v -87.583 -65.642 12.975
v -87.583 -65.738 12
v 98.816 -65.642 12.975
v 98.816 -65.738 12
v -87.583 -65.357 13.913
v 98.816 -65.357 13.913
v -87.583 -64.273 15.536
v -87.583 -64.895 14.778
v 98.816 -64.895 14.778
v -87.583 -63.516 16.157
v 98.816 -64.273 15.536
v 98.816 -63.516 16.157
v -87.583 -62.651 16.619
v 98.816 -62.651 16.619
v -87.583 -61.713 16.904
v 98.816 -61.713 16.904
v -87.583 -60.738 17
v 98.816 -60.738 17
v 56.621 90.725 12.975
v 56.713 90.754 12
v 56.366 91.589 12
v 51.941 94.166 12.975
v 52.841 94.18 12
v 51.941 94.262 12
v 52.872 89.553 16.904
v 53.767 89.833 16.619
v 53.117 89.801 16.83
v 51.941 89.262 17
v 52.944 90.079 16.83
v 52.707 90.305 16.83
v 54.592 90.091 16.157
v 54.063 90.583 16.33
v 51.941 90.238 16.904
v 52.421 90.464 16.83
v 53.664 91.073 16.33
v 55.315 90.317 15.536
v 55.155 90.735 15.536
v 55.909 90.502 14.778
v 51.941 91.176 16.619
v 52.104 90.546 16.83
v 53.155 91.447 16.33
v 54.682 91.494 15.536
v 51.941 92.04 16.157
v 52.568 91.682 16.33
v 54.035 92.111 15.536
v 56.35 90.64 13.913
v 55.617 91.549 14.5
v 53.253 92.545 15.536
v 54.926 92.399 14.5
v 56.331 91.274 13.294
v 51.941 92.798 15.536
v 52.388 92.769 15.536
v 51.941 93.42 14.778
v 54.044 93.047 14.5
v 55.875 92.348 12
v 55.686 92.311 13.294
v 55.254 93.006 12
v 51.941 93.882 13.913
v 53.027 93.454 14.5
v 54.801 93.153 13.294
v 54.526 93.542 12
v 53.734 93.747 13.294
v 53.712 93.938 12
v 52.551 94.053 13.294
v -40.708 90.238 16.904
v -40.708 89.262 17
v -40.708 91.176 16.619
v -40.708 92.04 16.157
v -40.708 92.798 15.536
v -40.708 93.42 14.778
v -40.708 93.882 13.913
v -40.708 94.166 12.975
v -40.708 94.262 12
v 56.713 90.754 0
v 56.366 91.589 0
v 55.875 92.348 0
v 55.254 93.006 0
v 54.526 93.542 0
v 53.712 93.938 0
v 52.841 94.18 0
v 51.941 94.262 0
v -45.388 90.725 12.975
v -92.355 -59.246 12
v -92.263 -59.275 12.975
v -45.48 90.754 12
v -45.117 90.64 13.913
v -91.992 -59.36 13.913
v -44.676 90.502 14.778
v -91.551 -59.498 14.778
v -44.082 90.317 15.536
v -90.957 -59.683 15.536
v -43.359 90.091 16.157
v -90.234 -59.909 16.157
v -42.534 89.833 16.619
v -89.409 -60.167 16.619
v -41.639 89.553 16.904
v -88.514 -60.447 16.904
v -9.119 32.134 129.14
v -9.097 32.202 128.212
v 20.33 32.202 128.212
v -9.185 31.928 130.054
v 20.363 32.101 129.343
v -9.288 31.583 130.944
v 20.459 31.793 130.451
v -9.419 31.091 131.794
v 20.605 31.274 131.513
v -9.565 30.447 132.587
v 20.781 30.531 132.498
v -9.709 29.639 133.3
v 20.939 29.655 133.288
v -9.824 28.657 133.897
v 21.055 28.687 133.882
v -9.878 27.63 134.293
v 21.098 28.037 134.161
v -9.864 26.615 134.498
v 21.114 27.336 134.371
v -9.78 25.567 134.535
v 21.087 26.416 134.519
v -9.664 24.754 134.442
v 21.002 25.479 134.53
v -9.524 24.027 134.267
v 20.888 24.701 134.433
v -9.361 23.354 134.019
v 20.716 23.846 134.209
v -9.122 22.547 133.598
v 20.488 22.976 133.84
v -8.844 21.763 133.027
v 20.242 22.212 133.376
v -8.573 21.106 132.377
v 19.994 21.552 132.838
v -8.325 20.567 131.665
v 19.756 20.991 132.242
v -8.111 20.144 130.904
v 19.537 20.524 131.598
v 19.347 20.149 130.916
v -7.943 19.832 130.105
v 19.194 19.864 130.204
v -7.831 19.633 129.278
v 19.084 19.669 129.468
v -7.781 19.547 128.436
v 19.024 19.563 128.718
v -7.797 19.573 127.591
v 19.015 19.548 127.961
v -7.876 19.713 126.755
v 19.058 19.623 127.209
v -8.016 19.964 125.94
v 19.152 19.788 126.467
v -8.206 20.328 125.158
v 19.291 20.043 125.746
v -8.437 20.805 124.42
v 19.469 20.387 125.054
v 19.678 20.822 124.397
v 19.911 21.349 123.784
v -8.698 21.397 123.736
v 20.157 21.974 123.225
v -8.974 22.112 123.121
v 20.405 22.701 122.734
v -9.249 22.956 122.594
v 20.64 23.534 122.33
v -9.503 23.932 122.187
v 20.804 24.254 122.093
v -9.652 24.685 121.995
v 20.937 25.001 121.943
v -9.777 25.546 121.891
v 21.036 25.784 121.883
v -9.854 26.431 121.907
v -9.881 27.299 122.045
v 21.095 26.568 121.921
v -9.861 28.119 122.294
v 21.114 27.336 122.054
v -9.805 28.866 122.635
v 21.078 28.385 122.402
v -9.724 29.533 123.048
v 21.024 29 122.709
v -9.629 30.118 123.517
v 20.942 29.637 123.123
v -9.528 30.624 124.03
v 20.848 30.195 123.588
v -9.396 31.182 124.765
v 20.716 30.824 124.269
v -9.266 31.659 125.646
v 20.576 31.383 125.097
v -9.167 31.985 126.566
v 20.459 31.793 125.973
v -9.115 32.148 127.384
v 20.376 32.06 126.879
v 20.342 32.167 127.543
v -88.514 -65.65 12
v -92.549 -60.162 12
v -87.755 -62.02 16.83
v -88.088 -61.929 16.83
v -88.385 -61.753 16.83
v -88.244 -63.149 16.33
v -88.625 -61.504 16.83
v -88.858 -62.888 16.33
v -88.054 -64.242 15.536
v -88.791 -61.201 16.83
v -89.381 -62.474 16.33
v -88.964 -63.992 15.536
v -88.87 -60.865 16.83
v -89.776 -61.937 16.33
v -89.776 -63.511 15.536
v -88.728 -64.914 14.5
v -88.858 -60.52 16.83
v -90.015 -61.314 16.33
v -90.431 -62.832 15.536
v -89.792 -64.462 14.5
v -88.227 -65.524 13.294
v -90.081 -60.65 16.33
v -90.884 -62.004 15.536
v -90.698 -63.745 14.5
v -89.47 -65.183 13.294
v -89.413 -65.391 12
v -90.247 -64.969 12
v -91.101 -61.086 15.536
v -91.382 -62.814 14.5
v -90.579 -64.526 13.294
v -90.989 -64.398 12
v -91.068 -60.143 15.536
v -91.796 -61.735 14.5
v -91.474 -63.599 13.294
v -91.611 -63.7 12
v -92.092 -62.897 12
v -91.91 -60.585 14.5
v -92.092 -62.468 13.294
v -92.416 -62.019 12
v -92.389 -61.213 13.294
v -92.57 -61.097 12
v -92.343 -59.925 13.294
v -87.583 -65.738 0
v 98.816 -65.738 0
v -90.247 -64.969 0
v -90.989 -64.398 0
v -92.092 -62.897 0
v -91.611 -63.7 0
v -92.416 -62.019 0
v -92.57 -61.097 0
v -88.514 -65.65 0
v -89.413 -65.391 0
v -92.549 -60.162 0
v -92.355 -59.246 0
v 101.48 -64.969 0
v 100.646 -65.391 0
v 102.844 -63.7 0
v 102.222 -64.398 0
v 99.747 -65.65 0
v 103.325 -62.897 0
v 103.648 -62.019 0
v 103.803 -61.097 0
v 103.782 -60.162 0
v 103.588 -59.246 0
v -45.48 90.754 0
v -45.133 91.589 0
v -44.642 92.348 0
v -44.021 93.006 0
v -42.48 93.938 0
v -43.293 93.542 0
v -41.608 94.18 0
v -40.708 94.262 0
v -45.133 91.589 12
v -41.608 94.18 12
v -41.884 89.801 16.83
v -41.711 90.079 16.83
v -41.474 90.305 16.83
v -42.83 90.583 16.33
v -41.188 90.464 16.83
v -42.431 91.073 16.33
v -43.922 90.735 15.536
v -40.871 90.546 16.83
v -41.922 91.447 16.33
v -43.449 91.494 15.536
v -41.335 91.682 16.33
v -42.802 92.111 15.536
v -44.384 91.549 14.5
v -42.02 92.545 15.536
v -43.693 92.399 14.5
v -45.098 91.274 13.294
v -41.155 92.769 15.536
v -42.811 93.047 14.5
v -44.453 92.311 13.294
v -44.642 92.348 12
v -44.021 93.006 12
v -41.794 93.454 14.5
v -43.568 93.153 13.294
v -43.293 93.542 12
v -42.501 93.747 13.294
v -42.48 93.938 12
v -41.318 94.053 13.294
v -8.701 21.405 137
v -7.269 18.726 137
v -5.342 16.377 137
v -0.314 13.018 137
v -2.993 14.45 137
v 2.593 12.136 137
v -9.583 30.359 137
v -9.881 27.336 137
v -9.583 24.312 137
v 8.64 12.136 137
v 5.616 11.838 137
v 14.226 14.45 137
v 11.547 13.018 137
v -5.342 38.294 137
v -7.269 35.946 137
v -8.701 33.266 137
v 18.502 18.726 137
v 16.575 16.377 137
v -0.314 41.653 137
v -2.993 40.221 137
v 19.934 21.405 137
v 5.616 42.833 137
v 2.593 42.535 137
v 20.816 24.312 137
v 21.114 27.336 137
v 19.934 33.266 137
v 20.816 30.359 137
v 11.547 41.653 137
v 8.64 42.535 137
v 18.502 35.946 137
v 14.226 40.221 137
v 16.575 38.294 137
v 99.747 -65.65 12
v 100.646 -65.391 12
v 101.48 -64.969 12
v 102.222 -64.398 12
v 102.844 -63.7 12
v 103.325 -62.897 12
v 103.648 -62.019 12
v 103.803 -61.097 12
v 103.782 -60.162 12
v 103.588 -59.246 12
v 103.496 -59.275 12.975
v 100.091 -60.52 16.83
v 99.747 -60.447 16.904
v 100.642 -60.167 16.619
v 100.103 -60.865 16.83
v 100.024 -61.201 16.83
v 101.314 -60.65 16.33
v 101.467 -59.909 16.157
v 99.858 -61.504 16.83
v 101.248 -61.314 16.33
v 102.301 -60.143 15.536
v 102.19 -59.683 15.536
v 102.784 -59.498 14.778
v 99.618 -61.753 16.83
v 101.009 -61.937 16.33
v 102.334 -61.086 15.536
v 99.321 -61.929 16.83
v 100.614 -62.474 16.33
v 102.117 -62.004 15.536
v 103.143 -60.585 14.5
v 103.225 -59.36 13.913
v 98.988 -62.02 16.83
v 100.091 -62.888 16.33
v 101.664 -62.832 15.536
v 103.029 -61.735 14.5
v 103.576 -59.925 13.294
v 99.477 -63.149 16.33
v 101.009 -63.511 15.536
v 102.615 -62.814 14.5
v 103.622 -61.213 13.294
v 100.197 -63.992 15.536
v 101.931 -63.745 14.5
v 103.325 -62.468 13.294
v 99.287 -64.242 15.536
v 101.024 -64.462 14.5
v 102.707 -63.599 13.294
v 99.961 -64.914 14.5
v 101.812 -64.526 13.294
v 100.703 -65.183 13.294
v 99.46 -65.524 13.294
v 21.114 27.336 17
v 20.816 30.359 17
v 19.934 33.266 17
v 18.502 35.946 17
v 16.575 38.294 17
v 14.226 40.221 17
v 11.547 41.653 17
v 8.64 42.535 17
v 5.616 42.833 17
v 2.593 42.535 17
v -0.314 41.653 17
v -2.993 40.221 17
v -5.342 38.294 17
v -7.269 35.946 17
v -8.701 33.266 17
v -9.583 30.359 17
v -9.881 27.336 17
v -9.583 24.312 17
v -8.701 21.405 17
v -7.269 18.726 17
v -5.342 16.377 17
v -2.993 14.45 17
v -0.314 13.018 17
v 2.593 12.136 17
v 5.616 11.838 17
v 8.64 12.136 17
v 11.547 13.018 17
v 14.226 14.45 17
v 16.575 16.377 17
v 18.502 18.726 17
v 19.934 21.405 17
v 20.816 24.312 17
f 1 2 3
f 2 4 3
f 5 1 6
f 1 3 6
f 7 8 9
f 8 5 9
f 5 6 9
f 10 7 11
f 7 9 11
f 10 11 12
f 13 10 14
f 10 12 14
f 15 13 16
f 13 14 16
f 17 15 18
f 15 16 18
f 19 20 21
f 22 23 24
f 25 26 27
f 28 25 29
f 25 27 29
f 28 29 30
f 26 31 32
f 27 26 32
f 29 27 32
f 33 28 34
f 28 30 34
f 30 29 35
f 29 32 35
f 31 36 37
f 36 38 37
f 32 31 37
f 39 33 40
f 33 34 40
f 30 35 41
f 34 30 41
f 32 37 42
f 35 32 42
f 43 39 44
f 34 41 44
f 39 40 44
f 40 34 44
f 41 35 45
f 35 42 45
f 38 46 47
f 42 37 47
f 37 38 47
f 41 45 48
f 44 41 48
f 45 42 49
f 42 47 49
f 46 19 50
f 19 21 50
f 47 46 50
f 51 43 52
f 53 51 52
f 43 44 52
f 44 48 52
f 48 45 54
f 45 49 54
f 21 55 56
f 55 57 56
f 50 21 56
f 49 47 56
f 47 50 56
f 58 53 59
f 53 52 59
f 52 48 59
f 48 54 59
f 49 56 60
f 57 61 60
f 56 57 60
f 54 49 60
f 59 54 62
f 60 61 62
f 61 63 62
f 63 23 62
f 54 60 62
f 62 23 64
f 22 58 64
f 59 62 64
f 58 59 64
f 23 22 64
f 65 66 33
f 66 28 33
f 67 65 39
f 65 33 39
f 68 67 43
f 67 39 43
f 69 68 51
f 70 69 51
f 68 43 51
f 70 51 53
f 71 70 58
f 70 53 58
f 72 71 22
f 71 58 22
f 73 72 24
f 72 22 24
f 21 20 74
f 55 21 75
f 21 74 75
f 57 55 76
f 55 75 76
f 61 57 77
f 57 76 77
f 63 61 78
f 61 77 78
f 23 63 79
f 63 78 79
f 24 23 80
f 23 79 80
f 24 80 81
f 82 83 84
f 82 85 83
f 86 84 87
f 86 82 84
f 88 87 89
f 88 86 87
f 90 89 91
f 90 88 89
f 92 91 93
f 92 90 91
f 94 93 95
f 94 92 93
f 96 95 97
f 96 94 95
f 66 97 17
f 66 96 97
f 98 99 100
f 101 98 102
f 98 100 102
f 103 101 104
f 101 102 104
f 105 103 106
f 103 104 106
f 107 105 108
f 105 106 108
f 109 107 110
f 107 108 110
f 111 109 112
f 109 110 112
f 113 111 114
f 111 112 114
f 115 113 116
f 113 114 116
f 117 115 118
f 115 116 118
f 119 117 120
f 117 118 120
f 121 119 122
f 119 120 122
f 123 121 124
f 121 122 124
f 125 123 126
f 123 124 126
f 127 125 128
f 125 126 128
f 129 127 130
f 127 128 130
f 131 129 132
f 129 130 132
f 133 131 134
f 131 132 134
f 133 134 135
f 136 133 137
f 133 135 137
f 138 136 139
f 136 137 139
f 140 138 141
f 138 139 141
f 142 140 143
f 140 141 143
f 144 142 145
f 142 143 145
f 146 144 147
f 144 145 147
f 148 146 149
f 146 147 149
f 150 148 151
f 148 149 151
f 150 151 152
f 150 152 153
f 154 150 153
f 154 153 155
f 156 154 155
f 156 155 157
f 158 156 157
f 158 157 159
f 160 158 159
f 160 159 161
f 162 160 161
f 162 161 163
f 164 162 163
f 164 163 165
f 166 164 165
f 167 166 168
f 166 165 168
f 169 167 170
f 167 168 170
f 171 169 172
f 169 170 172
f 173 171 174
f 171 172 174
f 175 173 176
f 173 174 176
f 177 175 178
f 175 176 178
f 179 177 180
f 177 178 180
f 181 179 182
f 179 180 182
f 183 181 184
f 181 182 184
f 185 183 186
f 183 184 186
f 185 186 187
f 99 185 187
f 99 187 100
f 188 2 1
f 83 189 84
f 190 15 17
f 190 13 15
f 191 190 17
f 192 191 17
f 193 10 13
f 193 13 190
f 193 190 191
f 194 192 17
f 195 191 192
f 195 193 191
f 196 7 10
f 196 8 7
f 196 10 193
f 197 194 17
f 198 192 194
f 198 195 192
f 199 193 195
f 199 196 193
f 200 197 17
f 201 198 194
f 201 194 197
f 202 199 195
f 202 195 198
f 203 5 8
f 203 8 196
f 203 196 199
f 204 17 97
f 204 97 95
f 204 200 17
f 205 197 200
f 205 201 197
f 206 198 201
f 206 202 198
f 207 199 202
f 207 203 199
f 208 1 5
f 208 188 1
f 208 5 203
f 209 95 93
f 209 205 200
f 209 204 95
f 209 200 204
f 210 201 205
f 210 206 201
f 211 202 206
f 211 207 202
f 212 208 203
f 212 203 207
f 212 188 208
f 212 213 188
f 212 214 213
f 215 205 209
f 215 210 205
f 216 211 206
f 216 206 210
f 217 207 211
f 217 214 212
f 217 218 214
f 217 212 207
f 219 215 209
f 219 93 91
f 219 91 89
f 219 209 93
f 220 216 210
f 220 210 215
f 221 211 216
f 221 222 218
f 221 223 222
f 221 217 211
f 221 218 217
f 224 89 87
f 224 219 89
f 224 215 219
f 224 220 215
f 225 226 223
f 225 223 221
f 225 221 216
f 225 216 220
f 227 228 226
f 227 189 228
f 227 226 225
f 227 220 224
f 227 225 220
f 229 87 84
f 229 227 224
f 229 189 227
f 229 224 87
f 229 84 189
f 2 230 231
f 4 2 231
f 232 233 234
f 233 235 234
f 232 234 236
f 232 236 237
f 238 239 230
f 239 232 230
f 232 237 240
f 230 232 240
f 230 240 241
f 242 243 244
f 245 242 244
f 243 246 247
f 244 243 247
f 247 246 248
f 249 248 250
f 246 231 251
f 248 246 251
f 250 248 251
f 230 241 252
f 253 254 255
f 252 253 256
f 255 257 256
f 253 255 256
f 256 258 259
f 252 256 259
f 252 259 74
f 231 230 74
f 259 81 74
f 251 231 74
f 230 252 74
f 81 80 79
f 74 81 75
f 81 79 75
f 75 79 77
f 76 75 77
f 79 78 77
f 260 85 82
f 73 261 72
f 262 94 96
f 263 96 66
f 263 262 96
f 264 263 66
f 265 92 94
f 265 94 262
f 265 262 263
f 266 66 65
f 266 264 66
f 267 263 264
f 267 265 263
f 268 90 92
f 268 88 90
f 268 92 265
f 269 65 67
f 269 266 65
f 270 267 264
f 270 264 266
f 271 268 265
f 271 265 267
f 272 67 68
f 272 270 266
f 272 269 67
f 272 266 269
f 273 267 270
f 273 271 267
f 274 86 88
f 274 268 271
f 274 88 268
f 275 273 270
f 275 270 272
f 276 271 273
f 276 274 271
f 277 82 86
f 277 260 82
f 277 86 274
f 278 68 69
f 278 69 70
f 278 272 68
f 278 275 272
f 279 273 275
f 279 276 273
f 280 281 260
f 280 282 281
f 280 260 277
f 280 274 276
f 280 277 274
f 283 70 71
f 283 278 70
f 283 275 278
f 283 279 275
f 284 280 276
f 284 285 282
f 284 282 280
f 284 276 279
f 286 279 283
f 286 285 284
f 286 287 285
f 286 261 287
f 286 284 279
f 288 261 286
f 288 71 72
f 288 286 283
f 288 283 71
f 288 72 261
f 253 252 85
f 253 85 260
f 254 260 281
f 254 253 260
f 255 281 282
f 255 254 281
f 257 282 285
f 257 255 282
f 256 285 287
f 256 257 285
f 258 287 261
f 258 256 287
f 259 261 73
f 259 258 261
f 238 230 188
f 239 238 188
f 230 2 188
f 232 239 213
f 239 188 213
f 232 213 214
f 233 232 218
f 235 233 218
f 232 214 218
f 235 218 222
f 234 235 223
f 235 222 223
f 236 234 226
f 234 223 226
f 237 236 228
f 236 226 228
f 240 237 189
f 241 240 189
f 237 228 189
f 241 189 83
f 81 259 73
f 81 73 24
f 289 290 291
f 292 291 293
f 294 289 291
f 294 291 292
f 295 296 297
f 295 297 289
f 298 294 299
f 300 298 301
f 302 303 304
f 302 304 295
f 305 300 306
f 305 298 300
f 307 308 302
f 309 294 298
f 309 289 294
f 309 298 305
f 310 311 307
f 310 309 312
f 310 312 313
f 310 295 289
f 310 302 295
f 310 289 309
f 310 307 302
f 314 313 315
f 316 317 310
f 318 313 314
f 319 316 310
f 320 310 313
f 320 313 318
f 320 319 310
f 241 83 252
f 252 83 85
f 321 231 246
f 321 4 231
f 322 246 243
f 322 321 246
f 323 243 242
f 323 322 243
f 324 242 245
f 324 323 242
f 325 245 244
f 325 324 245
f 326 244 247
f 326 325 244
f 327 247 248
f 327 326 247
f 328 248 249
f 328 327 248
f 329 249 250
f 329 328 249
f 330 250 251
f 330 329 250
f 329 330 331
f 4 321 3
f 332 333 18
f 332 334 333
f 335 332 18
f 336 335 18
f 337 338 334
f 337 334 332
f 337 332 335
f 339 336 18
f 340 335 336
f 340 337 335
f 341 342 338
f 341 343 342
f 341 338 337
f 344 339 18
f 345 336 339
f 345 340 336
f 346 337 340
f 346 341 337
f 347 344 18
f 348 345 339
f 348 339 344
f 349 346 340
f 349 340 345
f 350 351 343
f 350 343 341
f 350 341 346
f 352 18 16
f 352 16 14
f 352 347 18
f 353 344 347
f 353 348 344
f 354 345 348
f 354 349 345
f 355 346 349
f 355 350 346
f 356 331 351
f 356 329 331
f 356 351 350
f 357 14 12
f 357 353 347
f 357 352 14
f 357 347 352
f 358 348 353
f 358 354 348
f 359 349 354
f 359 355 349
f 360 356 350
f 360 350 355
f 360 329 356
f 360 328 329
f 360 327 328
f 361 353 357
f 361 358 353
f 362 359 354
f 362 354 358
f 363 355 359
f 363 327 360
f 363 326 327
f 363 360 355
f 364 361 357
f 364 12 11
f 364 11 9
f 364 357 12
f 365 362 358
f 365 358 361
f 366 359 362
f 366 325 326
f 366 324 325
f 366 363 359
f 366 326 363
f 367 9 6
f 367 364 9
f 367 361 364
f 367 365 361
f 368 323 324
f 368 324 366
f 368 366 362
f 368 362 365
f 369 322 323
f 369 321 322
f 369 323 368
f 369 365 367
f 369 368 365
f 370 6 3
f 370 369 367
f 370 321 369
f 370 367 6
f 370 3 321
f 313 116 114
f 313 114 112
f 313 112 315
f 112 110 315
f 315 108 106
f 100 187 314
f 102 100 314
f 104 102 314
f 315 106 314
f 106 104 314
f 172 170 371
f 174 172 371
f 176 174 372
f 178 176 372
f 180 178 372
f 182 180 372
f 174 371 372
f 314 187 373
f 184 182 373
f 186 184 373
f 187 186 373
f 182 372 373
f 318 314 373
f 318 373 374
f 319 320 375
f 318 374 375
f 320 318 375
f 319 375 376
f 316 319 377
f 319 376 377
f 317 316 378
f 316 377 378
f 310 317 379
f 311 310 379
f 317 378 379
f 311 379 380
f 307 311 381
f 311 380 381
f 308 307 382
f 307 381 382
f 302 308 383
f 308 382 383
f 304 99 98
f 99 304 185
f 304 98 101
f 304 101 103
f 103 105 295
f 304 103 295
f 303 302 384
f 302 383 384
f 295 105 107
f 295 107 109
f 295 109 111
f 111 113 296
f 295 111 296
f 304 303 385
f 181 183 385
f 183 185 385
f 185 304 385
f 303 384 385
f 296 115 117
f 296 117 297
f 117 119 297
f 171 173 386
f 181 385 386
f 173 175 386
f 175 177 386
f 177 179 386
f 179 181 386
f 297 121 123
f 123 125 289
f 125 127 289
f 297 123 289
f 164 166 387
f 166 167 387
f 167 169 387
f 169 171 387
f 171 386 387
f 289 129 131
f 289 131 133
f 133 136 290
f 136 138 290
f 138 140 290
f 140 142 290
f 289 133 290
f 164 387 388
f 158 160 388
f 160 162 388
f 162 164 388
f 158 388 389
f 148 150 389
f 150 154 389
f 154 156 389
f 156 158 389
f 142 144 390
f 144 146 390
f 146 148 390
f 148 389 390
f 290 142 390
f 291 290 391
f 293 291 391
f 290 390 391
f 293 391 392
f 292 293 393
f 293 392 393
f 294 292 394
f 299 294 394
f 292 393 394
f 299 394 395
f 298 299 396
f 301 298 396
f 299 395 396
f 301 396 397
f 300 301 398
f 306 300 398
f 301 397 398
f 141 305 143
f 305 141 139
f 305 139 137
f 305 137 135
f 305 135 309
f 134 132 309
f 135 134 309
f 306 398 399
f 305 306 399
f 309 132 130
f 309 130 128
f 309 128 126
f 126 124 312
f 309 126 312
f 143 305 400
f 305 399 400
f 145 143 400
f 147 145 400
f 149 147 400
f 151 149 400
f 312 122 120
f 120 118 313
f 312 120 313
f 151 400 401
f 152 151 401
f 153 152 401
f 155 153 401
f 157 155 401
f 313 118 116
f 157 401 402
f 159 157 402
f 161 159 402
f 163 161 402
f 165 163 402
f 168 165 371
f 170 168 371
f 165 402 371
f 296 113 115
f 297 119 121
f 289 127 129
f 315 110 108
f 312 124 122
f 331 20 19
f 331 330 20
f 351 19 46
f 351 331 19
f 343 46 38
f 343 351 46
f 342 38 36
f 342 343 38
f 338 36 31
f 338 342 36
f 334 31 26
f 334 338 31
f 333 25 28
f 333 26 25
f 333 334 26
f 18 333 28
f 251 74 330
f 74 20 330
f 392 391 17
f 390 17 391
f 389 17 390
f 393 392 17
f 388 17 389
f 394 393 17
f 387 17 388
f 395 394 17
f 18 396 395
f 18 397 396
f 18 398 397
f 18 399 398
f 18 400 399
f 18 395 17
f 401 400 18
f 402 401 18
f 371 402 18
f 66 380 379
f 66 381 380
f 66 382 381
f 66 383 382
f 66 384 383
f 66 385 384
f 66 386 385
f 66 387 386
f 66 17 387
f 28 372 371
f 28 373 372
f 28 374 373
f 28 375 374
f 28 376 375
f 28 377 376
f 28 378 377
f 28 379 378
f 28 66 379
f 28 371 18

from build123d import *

# Parameters (mm, degrees)
F0_W     = 200
F0_H     = 160
F1_DEPTH = 17
F3_DEPTH = 17.001
F4_R     = 5
F5_R     = 15.4974026332
F6_DEPTH = 120
F7_R     = 6.3299000504
F8_DEPTH = 41.6


with BuildPart() as f1:
    # F0 (on Top) → F1 (new body)
    with BuildSketch(Plane.XY):
        with Locations((5.6164655834, 14.2621519414)):
            Rectangle(F0_W, F0_H)
    extrude(amount=F1_DEPTH)

    # F2 (on face) → F3 (cut, through all)
    with BuildSketch(Plane.XY.offset(17)):
        Polygon((-94.3835344166, 94.2621519414), (-94.3835344166, -65.7378480586), (-44.3835344166, 94.2621519414), align=None)
        Polygon((55.6164655834, 94.2621519414), (105.6164655834, -65.7378480586), (105.6164655834, 94.2621519414), align=None)
    extrude(amount=-F3_DEPTH, mode=Mode.SUBTRACT)

    # F4
    f4_edges = [f1.edges().sort_by_distance(p)[0] for p in [
        (-94.383534, -65.737848, 8.5),
        (105.616466, -65.737848, 8.5),
        (55.616466, 94.262152, 8.5),
        (-44.383534, 94.262152, 8.5),
        (80.616466, 14.262152, 17),
        (5.616466, -65.737848, 17),
        (-69.383534, 14.262152, 17),
        (5.616466, 94.262152, 17),
    ]]
    fillet(f4_edges, radius=F4_R)

    # F5 (on face) → F6 (join)
    with BuildSketch(Plane.XY.offset(17)):
        with Locations((5.6164655834, 27.3357126862)):
            Circle(F5_R)
    extrude(amount=F6_DEPTH)

    # F7 (on Right) → F8 (cut, symmetric)
    with BuildSketch(Plane.YZ):
        with Locations((25.8725117892, 128.2121986151)):
            Circle(F7_R)
    extrude(amount=F8_DEPTH, both=True, mode=Mode.SUBTRACT)


solid = f1.part
